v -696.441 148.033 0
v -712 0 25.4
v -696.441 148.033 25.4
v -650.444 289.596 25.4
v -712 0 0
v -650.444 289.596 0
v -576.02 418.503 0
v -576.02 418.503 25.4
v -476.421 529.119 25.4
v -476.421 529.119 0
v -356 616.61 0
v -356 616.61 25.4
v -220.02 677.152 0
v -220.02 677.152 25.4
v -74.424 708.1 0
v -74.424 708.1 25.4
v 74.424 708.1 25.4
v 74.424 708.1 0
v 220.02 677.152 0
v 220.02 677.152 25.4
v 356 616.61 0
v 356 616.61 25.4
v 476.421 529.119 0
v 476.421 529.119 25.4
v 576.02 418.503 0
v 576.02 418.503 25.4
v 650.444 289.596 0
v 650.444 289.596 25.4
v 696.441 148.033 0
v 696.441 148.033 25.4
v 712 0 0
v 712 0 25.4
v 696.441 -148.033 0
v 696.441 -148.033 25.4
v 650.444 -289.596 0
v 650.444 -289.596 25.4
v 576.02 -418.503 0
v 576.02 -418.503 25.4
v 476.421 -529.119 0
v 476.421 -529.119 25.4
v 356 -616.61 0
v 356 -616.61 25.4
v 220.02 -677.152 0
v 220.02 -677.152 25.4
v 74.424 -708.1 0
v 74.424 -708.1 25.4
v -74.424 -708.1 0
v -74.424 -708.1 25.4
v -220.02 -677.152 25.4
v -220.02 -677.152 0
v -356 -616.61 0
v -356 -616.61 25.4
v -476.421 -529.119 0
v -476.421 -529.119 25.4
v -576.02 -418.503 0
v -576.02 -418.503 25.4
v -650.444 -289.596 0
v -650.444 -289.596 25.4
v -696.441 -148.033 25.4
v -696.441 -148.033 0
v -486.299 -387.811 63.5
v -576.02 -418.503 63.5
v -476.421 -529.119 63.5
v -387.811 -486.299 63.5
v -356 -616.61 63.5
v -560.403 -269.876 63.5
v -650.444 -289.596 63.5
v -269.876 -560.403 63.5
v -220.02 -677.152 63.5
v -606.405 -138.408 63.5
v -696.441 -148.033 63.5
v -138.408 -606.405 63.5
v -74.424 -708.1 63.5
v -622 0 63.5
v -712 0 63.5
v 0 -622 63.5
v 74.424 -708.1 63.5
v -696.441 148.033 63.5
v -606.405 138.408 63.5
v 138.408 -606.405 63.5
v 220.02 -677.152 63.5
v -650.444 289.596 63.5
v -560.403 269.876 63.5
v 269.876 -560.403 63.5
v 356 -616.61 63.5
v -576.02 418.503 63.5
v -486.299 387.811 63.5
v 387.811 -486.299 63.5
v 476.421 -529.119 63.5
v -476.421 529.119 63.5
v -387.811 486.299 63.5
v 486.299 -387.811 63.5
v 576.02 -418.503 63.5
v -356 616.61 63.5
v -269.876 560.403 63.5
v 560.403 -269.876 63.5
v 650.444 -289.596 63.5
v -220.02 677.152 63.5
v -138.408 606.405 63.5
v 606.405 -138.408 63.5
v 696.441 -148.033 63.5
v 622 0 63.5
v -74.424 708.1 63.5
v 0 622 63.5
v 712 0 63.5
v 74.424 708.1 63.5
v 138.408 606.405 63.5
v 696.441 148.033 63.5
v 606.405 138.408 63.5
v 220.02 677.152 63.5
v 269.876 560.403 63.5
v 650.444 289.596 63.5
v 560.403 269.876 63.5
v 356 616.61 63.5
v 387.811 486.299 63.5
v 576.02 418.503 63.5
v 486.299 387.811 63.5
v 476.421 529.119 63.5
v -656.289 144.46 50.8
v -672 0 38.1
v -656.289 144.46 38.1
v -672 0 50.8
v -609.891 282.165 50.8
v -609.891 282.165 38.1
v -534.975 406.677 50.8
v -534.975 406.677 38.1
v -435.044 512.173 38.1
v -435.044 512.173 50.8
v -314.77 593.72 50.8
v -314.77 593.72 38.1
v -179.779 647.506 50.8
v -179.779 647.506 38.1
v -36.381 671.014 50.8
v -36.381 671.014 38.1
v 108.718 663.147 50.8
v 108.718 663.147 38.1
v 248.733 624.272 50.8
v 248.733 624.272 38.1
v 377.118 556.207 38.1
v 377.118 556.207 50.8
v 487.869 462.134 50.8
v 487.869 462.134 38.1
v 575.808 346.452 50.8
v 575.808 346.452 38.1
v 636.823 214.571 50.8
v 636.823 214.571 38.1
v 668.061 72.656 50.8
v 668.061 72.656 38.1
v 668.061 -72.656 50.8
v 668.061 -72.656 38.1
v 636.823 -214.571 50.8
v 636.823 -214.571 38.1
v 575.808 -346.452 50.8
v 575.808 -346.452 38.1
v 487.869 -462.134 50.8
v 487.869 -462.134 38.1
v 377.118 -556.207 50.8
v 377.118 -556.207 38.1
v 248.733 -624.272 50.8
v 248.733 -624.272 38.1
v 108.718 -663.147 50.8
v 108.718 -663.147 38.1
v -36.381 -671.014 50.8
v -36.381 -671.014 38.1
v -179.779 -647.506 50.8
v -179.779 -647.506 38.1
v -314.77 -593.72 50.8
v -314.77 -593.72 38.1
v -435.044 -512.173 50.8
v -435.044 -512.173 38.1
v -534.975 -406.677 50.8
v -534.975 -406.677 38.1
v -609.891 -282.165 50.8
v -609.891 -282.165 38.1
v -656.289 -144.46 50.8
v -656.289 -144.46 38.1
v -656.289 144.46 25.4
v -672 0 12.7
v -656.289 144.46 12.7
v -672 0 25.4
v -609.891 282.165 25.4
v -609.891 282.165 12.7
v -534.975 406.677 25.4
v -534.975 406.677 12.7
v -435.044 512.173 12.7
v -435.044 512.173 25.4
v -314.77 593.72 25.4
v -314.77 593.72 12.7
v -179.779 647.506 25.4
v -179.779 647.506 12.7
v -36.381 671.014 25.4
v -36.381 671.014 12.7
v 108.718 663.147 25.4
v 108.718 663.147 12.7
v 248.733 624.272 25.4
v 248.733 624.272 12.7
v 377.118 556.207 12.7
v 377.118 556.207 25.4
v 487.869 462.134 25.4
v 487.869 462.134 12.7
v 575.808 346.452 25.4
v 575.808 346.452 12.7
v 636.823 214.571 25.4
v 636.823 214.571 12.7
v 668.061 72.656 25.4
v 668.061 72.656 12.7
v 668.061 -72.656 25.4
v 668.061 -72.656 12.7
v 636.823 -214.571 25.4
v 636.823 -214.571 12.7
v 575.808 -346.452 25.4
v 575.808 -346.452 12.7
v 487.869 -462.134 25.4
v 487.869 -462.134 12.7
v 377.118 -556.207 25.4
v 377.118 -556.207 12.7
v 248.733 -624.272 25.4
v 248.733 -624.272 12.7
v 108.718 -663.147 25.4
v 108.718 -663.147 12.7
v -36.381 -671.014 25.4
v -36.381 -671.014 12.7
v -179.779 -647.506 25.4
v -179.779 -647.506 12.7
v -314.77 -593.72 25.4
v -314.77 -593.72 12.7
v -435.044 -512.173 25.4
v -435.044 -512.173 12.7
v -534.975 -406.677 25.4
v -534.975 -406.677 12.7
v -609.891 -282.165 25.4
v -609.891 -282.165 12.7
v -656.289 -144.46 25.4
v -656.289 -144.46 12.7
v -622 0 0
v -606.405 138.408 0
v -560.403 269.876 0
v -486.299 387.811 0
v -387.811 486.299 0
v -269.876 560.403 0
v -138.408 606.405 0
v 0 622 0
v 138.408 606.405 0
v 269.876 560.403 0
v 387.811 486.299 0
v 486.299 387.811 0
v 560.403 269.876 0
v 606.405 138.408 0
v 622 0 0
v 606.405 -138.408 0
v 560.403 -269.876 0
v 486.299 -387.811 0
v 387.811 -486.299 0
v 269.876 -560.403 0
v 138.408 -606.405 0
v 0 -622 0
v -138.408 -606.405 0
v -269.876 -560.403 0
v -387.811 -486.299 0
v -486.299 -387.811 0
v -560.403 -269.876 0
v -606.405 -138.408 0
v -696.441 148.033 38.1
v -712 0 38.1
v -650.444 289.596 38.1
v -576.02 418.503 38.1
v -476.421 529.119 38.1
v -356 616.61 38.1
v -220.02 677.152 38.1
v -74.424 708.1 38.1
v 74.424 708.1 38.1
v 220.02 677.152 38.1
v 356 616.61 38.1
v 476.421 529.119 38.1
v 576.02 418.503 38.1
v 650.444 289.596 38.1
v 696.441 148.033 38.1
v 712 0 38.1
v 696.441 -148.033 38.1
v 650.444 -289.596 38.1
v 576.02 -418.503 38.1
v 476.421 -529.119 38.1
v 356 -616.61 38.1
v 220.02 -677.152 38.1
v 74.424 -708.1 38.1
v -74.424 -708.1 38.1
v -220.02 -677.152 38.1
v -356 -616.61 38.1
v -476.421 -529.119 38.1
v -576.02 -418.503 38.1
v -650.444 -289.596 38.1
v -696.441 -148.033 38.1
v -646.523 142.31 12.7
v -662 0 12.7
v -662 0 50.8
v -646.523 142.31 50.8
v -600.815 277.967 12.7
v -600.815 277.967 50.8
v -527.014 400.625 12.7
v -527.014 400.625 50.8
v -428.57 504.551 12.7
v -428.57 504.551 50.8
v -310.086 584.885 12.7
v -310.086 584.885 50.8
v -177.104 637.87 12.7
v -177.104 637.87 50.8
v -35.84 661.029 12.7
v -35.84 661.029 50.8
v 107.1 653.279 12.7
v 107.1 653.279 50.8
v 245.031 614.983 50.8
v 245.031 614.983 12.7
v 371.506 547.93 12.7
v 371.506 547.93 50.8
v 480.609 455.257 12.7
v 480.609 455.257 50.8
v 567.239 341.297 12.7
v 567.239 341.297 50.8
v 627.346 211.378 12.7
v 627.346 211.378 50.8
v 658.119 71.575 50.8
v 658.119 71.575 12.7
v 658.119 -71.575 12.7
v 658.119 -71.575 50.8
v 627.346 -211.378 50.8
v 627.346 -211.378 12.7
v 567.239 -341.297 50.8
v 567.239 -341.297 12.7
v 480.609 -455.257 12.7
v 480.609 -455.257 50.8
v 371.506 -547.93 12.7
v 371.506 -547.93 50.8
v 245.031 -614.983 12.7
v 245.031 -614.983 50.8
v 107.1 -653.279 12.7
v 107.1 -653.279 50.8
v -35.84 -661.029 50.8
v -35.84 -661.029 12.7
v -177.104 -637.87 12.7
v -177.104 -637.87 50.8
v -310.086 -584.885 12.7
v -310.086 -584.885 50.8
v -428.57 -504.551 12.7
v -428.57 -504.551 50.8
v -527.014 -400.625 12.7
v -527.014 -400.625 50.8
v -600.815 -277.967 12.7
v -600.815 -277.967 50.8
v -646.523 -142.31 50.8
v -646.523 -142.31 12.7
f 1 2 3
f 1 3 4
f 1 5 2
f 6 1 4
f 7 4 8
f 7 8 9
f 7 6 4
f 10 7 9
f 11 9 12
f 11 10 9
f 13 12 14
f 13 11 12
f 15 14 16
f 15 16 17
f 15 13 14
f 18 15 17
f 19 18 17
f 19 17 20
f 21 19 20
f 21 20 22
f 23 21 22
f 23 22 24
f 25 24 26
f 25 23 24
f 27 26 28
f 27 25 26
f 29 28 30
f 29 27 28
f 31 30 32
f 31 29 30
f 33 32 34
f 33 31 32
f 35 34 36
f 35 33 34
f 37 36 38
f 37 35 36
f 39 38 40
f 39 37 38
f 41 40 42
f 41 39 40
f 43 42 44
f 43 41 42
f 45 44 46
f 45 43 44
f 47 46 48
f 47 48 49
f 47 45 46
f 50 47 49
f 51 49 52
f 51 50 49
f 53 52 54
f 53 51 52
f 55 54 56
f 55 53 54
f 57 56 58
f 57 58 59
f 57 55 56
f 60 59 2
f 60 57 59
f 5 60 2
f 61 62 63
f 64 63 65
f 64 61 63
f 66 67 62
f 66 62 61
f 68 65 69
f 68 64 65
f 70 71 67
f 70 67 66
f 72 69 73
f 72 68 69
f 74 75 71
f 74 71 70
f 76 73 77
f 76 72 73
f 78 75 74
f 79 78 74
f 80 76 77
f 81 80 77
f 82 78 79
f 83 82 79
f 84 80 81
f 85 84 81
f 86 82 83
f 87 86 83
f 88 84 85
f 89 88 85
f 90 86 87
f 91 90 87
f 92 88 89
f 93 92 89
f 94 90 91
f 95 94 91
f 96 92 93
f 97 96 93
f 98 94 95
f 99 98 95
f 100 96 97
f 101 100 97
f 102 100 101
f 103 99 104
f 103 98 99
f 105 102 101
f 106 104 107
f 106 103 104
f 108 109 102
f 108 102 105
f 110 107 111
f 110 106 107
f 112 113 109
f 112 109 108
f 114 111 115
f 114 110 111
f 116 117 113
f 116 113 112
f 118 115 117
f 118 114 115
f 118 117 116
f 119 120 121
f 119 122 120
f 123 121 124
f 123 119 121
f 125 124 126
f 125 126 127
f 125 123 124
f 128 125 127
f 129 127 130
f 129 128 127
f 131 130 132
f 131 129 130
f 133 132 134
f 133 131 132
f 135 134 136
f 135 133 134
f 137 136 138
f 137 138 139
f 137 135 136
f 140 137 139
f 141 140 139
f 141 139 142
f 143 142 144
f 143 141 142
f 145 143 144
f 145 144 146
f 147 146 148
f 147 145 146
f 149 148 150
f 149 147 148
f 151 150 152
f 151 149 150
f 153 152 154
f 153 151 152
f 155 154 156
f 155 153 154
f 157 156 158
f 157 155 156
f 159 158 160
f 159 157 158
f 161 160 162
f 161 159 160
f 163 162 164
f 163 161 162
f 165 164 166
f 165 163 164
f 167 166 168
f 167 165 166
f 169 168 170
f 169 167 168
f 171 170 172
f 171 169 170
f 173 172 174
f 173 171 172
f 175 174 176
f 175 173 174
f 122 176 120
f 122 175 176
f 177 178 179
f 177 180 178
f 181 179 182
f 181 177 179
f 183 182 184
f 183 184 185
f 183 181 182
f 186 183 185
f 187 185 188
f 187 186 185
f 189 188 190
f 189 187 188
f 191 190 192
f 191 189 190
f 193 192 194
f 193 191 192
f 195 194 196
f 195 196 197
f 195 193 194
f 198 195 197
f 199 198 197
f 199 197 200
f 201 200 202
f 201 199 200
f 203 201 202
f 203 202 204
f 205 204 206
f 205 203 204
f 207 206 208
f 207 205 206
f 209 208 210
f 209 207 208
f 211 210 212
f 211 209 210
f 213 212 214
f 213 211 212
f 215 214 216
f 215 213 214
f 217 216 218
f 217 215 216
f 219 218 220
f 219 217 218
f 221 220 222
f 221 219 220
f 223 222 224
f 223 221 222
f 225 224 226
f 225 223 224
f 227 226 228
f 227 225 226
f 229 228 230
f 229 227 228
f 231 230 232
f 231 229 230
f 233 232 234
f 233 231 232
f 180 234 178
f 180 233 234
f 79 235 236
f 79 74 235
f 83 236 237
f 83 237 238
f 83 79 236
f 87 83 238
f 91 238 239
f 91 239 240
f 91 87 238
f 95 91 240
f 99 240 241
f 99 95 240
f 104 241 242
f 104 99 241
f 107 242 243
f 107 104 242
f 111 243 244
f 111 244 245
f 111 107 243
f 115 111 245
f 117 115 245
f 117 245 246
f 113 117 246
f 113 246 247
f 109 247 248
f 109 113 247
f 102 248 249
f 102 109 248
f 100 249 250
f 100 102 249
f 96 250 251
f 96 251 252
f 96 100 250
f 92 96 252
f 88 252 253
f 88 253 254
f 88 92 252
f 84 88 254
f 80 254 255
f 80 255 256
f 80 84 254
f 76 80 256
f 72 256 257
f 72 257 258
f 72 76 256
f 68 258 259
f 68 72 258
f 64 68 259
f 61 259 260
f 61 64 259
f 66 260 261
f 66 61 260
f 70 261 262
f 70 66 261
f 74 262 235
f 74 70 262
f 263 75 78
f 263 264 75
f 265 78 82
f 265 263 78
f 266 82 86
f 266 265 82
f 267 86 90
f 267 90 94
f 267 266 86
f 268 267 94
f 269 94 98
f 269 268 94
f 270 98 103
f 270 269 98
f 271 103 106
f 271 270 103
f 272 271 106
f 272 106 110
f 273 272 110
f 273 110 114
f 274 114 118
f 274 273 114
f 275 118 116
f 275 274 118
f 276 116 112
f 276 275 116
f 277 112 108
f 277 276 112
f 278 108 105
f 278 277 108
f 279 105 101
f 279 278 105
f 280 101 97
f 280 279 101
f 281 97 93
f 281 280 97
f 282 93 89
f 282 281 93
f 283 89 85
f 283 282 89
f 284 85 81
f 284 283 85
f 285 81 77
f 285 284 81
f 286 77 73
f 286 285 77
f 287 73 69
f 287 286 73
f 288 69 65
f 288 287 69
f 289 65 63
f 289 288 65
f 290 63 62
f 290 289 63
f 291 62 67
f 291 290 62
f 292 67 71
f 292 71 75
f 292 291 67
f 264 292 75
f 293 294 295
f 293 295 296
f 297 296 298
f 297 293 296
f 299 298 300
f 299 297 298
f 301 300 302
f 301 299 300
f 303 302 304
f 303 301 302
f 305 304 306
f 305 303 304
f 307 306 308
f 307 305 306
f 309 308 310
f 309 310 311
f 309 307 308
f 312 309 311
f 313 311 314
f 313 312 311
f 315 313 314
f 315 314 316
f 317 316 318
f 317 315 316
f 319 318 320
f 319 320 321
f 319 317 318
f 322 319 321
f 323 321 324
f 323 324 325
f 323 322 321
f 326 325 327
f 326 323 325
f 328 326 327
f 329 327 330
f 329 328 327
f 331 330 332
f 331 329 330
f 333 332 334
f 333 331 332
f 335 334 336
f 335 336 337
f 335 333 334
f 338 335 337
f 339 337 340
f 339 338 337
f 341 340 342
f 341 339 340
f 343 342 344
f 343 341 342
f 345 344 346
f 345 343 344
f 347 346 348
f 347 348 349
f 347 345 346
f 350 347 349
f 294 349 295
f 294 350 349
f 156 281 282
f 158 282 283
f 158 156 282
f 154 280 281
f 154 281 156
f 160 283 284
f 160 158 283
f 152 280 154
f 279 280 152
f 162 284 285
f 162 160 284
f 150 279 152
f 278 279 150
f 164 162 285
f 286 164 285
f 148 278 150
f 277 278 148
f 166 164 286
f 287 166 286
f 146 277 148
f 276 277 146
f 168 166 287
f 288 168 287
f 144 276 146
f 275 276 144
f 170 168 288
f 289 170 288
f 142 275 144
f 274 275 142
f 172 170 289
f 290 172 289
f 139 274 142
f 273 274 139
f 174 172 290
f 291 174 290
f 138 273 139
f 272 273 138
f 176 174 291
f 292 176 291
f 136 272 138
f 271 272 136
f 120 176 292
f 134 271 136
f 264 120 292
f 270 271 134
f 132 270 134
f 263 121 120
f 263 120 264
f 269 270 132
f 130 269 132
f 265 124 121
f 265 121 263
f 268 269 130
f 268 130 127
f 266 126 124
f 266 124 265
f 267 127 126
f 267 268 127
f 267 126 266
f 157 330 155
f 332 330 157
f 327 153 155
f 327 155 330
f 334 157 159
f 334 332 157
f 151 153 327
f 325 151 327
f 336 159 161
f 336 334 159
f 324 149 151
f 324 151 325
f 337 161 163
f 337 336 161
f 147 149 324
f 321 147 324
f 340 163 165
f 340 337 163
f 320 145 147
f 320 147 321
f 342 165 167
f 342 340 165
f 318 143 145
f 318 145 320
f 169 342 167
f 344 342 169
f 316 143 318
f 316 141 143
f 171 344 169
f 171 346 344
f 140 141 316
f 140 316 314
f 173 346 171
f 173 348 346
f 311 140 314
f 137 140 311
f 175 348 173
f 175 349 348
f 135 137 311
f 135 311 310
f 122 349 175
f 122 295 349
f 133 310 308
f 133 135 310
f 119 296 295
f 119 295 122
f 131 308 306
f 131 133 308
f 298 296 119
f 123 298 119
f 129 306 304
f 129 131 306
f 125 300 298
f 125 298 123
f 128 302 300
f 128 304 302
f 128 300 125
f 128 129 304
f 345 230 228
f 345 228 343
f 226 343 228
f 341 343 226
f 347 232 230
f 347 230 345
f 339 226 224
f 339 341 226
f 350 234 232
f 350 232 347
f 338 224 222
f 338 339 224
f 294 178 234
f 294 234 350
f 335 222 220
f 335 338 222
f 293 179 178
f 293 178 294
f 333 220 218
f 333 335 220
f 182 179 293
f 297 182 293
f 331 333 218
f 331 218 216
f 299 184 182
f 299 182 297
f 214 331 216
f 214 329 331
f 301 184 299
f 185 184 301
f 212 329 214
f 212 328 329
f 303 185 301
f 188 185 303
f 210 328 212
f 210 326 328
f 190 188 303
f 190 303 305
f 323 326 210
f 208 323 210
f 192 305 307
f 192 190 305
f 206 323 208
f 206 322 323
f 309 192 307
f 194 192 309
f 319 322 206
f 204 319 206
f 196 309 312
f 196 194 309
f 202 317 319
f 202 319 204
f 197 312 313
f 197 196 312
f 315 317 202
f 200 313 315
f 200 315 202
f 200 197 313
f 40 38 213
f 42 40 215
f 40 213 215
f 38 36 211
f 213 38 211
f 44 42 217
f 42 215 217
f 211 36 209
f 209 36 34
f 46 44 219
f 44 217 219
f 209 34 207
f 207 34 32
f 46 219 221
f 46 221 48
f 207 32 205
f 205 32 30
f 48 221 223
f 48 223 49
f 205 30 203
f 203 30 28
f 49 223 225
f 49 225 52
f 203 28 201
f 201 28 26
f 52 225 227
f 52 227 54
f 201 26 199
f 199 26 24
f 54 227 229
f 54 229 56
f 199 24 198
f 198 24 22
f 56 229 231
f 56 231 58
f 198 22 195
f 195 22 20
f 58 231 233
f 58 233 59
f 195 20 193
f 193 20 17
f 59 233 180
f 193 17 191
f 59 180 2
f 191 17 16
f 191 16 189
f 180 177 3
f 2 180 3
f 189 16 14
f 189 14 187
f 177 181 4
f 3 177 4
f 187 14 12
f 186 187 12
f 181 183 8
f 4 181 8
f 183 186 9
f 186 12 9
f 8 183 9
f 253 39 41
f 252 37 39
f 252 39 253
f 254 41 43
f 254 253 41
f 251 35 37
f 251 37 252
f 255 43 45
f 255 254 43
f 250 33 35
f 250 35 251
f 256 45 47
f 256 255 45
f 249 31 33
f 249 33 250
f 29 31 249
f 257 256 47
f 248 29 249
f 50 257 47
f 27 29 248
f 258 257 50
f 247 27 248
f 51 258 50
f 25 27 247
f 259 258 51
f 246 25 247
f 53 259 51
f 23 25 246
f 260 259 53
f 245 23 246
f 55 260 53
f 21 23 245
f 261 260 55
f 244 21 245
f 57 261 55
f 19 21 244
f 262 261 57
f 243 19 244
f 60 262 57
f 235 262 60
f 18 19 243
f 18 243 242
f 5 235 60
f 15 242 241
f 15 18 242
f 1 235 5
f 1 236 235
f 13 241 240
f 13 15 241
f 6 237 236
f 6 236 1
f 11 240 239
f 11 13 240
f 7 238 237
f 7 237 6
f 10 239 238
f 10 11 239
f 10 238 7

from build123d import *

# Parameters (mm, degrees)
F0_W = 40
F0_H = 12.7


with BuildPart() as f1:
    # F0 (on Front) → F1 (revolve)
    with BuildSketch(Plane.XZ):
        Polygon((-622, 0), (-622, 63.5), (-662, 63.5), (-662, 50.8), (-662, 12.7), (-662, 0), align=None)
    revolve(axis=Axis((0, 0, 31.75), (0, 0, -1)))

    # F0 (on Front) → F2 (revolve)
    with BuildSketch(Plane.XZ):
        Polygon((-662, 50.8), (-662, 63.5), (-712, 63.5), (-712, 50.8), (-672, 50.8), align=None)
        with Locations((-692, 44.45)):
            Rectangle(F0_W, F0_H)
    revolve(axis=Axis((0, 0, 31.75), (0, 0, -1)))

    # F0 (on Front) → F3 (revolve)
    with BuildSketch(Plane.XZ):
        with Locations((-692, 19.05)):
            Rectangle(F0_W, F0_H)
        Polygon((-712, 0), (-662, 0), (-662, 12.7), (-672, 12.7), (-712, 12.7), align=None)
    revolve(axis=Axis((0, 0, 31.75), (0, 0, -1)))


solid = f1.part
